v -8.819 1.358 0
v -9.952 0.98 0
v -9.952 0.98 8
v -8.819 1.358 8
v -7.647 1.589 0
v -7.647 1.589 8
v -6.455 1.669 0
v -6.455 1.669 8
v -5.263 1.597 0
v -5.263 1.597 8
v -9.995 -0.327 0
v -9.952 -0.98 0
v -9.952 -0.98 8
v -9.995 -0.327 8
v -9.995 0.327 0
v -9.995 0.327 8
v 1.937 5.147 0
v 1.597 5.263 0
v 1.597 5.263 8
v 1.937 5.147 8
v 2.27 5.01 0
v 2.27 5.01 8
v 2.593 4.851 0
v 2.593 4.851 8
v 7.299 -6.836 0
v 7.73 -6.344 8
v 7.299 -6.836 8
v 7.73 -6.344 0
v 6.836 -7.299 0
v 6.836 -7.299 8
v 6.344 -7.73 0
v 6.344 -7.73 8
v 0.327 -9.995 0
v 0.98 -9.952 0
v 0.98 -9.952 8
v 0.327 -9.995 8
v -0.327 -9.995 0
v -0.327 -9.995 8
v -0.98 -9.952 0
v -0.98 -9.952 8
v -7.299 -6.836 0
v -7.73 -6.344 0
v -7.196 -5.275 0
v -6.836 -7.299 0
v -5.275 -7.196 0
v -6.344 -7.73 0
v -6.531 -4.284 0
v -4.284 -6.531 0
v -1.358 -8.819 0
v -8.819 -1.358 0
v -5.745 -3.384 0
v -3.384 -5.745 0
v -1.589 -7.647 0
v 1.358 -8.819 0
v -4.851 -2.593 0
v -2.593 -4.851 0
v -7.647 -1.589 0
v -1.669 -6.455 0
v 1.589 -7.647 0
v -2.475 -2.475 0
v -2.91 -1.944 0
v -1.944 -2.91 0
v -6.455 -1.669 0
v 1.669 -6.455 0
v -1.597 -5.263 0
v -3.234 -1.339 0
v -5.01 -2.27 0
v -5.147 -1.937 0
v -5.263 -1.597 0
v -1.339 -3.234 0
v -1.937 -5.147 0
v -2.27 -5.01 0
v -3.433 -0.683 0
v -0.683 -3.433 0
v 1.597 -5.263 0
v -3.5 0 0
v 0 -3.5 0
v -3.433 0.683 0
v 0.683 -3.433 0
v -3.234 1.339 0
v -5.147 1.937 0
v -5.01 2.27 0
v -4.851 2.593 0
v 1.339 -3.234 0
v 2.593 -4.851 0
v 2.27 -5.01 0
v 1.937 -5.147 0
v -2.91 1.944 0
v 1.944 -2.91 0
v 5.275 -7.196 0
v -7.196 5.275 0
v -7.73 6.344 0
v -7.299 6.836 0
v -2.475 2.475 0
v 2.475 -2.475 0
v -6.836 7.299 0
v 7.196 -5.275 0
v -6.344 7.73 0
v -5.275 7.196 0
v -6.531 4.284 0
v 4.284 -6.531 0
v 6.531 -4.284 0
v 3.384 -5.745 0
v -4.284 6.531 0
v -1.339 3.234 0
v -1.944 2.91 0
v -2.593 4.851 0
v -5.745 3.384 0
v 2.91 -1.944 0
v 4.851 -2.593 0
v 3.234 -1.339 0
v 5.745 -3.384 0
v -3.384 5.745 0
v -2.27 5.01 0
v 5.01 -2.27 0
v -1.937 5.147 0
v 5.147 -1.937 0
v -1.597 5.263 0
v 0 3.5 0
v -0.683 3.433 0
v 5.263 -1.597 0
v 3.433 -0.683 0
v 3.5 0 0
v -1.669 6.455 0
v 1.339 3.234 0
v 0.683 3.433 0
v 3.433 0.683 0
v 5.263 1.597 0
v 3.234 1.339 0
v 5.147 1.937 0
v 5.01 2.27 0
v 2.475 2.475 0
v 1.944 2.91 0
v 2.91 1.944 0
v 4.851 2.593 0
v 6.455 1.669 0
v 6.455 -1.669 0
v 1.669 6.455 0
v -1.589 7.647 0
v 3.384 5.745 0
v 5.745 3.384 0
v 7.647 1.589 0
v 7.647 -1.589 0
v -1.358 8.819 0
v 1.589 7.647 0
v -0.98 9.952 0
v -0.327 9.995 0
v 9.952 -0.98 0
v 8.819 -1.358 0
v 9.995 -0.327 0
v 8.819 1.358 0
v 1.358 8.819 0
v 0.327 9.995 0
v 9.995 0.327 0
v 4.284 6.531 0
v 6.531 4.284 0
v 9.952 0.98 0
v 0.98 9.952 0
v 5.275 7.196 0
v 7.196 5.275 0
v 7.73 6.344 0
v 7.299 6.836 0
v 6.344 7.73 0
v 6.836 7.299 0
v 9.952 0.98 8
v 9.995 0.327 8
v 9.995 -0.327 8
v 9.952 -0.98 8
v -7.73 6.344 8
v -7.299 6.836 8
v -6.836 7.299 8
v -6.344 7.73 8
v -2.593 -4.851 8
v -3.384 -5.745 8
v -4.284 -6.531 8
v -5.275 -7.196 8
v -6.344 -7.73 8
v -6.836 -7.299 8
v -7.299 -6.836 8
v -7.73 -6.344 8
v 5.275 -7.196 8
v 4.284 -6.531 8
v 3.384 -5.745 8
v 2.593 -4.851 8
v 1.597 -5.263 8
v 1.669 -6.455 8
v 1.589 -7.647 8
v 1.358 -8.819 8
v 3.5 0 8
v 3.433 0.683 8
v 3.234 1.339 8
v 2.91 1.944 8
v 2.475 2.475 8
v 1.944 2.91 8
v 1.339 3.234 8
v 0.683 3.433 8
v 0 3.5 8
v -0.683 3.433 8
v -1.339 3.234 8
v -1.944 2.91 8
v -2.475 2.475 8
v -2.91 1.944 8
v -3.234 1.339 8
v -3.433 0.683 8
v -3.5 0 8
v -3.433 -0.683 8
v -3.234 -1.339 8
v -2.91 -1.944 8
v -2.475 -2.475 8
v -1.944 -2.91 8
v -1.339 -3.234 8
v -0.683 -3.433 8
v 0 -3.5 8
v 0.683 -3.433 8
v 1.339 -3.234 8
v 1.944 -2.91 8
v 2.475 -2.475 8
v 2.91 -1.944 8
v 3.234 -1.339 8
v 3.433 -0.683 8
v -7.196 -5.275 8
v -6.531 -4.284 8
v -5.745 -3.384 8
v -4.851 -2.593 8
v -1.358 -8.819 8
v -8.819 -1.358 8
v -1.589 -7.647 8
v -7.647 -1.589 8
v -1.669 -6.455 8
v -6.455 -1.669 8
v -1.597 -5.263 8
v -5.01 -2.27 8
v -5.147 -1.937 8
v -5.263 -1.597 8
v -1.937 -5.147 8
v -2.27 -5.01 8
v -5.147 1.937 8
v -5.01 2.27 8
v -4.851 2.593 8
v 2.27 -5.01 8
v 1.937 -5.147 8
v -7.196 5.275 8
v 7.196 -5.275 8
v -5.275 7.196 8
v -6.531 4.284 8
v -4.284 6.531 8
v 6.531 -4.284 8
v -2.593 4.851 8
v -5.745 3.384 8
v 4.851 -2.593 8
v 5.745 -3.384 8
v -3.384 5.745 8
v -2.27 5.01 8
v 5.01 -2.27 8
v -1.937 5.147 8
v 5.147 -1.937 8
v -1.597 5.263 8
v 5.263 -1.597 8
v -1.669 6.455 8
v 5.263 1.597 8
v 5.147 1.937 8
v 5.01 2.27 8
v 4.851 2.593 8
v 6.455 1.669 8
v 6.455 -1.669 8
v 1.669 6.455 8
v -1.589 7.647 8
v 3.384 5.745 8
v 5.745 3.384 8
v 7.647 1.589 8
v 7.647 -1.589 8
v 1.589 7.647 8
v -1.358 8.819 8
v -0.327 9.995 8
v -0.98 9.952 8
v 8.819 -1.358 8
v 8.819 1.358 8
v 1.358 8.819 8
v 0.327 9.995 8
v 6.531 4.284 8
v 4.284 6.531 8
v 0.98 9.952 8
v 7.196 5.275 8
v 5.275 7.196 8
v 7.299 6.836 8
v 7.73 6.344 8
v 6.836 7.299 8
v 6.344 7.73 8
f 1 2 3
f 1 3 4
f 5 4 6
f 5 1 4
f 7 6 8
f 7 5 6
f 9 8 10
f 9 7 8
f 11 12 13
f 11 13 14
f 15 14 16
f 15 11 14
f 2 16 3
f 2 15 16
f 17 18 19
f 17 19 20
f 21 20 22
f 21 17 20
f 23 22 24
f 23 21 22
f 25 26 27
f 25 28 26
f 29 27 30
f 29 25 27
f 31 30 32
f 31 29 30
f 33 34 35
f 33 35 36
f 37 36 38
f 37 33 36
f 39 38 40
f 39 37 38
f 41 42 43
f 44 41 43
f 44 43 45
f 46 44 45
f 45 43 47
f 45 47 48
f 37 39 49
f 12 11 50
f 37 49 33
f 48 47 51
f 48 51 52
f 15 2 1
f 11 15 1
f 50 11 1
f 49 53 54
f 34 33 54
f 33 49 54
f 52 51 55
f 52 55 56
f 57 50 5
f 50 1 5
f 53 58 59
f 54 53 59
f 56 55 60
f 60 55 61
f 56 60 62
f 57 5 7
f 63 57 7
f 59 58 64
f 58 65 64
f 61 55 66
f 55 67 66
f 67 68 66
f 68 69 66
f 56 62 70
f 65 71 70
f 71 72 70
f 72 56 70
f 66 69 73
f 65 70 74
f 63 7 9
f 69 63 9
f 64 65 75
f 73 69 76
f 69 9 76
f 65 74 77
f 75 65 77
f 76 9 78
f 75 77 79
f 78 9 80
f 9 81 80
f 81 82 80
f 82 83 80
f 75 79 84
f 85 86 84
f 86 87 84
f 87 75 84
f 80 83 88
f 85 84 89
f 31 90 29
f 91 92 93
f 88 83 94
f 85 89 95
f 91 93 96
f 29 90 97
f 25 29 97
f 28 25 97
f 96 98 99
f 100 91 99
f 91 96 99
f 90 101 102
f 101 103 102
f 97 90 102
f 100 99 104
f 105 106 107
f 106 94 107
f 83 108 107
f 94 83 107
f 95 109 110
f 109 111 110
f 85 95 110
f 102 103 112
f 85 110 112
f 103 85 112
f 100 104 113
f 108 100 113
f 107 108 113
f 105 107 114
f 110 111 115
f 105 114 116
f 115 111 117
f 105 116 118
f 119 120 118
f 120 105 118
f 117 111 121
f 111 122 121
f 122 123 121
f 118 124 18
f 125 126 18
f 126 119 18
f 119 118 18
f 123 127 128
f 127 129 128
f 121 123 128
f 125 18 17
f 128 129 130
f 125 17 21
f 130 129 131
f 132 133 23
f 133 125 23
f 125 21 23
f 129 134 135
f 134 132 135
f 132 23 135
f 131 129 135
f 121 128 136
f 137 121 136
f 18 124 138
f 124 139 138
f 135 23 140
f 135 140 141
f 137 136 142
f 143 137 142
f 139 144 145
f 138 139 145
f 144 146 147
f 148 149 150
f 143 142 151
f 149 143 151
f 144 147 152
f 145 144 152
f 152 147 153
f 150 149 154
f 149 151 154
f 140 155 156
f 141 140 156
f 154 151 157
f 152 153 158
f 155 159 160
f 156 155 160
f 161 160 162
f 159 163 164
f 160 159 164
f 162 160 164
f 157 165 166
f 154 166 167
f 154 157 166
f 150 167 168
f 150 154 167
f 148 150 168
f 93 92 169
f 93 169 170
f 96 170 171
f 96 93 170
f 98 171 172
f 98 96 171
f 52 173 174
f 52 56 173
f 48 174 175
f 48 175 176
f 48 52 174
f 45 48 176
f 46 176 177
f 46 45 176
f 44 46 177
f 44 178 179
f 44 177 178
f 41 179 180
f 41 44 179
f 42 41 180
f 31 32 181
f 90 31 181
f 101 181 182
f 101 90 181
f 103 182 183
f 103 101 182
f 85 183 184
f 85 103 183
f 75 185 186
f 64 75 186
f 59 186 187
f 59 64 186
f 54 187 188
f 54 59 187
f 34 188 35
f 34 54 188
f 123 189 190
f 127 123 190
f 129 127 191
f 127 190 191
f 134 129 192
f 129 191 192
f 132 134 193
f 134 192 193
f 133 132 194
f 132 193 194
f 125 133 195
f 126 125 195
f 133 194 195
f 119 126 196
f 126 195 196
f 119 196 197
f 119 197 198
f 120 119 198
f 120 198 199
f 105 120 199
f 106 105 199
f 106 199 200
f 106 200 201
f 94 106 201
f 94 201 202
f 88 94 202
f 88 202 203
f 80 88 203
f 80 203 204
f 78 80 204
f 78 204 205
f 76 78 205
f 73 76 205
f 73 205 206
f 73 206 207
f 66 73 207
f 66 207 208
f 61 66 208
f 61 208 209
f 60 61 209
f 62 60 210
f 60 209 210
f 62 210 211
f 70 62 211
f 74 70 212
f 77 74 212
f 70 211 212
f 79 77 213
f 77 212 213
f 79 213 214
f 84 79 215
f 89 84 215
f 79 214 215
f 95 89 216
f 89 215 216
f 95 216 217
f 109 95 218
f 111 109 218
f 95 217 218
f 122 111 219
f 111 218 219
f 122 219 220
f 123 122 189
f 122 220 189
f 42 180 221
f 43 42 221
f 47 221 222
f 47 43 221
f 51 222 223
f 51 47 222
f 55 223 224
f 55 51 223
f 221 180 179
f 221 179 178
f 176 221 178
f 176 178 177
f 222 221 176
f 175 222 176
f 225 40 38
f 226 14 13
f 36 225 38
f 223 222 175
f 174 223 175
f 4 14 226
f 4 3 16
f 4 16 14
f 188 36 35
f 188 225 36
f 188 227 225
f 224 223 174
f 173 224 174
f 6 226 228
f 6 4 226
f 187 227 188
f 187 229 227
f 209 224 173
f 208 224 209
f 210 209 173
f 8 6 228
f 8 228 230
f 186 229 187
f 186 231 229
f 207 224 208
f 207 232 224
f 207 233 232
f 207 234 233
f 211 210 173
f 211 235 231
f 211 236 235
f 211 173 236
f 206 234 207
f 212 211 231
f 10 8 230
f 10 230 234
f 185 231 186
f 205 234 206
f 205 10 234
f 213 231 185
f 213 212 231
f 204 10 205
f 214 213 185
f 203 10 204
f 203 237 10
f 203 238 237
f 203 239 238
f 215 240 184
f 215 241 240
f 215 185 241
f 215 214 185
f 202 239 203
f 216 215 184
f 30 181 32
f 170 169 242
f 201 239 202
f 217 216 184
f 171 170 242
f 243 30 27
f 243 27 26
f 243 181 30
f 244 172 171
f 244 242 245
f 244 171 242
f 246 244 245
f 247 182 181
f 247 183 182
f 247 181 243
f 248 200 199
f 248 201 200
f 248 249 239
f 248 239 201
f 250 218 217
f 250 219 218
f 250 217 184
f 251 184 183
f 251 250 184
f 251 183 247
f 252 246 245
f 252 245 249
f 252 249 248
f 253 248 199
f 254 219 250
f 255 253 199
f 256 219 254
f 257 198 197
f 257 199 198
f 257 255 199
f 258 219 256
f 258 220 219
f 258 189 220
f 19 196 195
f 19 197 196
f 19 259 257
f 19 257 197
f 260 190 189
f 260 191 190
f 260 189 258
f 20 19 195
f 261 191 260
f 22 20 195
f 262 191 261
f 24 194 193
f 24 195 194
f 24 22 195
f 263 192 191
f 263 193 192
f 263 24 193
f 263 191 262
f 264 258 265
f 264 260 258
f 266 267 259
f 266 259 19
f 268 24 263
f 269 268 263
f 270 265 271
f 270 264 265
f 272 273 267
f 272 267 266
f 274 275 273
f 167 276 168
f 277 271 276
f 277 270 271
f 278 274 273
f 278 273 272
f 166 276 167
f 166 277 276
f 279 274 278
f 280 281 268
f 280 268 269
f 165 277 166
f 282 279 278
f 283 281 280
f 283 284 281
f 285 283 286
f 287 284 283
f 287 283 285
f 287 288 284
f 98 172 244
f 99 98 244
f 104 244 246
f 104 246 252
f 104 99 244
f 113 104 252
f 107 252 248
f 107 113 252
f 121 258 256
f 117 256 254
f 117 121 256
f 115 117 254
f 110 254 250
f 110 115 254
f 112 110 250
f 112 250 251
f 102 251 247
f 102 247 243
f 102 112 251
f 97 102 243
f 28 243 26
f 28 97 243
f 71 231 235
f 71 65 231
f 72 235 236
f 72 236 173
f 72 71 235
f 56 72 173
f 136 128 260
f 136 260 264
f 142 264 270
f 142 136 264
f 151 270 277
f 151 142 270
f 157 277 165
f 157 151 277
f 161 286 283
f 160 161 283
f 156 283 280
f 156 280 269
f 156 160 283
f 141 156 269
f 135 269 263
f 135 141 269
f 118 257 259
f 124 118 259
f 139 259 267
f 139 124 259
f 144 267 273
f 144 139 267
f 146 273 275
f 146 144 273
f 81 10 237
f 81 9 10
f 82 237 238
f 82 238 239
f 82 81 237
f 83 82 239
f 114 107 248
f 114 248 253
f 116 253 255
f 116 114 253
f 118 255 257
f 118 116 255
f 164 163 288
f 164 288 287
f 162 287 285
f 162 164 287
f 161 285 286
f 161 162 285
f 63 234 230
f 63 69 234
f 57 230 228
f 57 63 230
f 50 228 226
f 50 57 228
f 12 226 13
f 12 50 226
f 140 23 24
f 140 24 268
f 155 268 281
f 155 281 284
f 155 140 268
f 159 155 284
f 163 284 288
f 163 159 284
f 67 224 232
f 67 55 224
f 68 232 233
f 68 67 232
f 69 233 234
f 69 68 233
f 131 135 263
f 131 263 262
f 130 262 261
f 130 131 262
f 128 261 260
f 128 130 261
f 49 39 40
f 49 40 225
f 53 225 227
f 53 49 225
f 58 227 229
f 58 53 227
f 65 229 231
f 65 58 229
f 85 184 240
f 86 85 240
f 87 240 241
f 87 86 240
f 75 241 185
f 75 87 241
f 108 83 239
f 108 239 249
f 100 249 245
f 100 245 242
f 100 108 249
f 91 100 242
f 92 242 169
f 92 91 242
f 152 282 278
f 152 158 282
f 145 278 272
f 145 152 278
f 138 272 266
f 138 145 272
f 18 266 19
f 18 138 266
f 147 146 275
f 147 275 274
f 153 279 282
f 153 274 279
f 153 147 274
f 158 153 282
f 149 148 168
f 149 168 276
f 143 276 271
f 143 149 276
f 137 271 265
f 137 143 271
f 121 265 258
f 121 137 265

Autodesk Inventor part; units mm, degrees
sketch "Sketch1" plane through (0, 0, 0) normal (0, 0, 1) x (1, 0, 0)
  circle A0 centre (0, 0) radius 10
  dimension "d0" = 20
extrude "Extrusion1" add sketch "Sketch1" along normal blind 8
ref_plane "Work Plane2" through (0, 0, 4) normal (0, 0, 1) x (1, 0, 0)
sketch "Sketch2" plane through (0, 0, 0) normal (0, 0, -1) x (-1, 0, 0)
  circle A0 centre (0, 0) radius 10 projected
  circle A1 centre (0, 0) radius 8
  dimension "d3" = 16
surface extrude "Pitch Diameter" sketch "Sketch2" against normal through all shown no curves A1
ref_plane "Work Plane8" through (0, 0, 0) normal (0.9238795, 0.3826834, 0) x (0, 0, 1)
ref_plane "Work Plane9" through (0, 0, 0) normal (1, 0, 0) x (0, 1, 0)
spur gear teeth "Spur Gear" teeth 8 pitch diameter 16 tip diameter 20 root diameter 11 face width 8 start plane through (0, 0, 0) normal (0, 0, -1) x (-1, 0, 0)
sketch "Sketch3" plane through (0, 0, 8) normal (0, 0, 1) x (1, 0, 0)
  circle A0 centre (0, 0) radius 3.5
  dimension "d52" = 7
extrude "Extrusion2" cut sketch "Sketch3" against normal through all
equation "\"d0\" = da_da"
equation "\"d1\" = da_b"
equation "\"d3\" = da_d"
equation "\"d16\" = da_aw"
equation "\"d43\" = da_aw"
equation "\"d46\" = da_aw"
equation "\"da_da\" = 20"
equation "\"da_b\" = 8"
equation "\"da_d\" = 16"
equation "\"da_aw\" = 65"
properties part number "Spur Gear1" material "Steel"
